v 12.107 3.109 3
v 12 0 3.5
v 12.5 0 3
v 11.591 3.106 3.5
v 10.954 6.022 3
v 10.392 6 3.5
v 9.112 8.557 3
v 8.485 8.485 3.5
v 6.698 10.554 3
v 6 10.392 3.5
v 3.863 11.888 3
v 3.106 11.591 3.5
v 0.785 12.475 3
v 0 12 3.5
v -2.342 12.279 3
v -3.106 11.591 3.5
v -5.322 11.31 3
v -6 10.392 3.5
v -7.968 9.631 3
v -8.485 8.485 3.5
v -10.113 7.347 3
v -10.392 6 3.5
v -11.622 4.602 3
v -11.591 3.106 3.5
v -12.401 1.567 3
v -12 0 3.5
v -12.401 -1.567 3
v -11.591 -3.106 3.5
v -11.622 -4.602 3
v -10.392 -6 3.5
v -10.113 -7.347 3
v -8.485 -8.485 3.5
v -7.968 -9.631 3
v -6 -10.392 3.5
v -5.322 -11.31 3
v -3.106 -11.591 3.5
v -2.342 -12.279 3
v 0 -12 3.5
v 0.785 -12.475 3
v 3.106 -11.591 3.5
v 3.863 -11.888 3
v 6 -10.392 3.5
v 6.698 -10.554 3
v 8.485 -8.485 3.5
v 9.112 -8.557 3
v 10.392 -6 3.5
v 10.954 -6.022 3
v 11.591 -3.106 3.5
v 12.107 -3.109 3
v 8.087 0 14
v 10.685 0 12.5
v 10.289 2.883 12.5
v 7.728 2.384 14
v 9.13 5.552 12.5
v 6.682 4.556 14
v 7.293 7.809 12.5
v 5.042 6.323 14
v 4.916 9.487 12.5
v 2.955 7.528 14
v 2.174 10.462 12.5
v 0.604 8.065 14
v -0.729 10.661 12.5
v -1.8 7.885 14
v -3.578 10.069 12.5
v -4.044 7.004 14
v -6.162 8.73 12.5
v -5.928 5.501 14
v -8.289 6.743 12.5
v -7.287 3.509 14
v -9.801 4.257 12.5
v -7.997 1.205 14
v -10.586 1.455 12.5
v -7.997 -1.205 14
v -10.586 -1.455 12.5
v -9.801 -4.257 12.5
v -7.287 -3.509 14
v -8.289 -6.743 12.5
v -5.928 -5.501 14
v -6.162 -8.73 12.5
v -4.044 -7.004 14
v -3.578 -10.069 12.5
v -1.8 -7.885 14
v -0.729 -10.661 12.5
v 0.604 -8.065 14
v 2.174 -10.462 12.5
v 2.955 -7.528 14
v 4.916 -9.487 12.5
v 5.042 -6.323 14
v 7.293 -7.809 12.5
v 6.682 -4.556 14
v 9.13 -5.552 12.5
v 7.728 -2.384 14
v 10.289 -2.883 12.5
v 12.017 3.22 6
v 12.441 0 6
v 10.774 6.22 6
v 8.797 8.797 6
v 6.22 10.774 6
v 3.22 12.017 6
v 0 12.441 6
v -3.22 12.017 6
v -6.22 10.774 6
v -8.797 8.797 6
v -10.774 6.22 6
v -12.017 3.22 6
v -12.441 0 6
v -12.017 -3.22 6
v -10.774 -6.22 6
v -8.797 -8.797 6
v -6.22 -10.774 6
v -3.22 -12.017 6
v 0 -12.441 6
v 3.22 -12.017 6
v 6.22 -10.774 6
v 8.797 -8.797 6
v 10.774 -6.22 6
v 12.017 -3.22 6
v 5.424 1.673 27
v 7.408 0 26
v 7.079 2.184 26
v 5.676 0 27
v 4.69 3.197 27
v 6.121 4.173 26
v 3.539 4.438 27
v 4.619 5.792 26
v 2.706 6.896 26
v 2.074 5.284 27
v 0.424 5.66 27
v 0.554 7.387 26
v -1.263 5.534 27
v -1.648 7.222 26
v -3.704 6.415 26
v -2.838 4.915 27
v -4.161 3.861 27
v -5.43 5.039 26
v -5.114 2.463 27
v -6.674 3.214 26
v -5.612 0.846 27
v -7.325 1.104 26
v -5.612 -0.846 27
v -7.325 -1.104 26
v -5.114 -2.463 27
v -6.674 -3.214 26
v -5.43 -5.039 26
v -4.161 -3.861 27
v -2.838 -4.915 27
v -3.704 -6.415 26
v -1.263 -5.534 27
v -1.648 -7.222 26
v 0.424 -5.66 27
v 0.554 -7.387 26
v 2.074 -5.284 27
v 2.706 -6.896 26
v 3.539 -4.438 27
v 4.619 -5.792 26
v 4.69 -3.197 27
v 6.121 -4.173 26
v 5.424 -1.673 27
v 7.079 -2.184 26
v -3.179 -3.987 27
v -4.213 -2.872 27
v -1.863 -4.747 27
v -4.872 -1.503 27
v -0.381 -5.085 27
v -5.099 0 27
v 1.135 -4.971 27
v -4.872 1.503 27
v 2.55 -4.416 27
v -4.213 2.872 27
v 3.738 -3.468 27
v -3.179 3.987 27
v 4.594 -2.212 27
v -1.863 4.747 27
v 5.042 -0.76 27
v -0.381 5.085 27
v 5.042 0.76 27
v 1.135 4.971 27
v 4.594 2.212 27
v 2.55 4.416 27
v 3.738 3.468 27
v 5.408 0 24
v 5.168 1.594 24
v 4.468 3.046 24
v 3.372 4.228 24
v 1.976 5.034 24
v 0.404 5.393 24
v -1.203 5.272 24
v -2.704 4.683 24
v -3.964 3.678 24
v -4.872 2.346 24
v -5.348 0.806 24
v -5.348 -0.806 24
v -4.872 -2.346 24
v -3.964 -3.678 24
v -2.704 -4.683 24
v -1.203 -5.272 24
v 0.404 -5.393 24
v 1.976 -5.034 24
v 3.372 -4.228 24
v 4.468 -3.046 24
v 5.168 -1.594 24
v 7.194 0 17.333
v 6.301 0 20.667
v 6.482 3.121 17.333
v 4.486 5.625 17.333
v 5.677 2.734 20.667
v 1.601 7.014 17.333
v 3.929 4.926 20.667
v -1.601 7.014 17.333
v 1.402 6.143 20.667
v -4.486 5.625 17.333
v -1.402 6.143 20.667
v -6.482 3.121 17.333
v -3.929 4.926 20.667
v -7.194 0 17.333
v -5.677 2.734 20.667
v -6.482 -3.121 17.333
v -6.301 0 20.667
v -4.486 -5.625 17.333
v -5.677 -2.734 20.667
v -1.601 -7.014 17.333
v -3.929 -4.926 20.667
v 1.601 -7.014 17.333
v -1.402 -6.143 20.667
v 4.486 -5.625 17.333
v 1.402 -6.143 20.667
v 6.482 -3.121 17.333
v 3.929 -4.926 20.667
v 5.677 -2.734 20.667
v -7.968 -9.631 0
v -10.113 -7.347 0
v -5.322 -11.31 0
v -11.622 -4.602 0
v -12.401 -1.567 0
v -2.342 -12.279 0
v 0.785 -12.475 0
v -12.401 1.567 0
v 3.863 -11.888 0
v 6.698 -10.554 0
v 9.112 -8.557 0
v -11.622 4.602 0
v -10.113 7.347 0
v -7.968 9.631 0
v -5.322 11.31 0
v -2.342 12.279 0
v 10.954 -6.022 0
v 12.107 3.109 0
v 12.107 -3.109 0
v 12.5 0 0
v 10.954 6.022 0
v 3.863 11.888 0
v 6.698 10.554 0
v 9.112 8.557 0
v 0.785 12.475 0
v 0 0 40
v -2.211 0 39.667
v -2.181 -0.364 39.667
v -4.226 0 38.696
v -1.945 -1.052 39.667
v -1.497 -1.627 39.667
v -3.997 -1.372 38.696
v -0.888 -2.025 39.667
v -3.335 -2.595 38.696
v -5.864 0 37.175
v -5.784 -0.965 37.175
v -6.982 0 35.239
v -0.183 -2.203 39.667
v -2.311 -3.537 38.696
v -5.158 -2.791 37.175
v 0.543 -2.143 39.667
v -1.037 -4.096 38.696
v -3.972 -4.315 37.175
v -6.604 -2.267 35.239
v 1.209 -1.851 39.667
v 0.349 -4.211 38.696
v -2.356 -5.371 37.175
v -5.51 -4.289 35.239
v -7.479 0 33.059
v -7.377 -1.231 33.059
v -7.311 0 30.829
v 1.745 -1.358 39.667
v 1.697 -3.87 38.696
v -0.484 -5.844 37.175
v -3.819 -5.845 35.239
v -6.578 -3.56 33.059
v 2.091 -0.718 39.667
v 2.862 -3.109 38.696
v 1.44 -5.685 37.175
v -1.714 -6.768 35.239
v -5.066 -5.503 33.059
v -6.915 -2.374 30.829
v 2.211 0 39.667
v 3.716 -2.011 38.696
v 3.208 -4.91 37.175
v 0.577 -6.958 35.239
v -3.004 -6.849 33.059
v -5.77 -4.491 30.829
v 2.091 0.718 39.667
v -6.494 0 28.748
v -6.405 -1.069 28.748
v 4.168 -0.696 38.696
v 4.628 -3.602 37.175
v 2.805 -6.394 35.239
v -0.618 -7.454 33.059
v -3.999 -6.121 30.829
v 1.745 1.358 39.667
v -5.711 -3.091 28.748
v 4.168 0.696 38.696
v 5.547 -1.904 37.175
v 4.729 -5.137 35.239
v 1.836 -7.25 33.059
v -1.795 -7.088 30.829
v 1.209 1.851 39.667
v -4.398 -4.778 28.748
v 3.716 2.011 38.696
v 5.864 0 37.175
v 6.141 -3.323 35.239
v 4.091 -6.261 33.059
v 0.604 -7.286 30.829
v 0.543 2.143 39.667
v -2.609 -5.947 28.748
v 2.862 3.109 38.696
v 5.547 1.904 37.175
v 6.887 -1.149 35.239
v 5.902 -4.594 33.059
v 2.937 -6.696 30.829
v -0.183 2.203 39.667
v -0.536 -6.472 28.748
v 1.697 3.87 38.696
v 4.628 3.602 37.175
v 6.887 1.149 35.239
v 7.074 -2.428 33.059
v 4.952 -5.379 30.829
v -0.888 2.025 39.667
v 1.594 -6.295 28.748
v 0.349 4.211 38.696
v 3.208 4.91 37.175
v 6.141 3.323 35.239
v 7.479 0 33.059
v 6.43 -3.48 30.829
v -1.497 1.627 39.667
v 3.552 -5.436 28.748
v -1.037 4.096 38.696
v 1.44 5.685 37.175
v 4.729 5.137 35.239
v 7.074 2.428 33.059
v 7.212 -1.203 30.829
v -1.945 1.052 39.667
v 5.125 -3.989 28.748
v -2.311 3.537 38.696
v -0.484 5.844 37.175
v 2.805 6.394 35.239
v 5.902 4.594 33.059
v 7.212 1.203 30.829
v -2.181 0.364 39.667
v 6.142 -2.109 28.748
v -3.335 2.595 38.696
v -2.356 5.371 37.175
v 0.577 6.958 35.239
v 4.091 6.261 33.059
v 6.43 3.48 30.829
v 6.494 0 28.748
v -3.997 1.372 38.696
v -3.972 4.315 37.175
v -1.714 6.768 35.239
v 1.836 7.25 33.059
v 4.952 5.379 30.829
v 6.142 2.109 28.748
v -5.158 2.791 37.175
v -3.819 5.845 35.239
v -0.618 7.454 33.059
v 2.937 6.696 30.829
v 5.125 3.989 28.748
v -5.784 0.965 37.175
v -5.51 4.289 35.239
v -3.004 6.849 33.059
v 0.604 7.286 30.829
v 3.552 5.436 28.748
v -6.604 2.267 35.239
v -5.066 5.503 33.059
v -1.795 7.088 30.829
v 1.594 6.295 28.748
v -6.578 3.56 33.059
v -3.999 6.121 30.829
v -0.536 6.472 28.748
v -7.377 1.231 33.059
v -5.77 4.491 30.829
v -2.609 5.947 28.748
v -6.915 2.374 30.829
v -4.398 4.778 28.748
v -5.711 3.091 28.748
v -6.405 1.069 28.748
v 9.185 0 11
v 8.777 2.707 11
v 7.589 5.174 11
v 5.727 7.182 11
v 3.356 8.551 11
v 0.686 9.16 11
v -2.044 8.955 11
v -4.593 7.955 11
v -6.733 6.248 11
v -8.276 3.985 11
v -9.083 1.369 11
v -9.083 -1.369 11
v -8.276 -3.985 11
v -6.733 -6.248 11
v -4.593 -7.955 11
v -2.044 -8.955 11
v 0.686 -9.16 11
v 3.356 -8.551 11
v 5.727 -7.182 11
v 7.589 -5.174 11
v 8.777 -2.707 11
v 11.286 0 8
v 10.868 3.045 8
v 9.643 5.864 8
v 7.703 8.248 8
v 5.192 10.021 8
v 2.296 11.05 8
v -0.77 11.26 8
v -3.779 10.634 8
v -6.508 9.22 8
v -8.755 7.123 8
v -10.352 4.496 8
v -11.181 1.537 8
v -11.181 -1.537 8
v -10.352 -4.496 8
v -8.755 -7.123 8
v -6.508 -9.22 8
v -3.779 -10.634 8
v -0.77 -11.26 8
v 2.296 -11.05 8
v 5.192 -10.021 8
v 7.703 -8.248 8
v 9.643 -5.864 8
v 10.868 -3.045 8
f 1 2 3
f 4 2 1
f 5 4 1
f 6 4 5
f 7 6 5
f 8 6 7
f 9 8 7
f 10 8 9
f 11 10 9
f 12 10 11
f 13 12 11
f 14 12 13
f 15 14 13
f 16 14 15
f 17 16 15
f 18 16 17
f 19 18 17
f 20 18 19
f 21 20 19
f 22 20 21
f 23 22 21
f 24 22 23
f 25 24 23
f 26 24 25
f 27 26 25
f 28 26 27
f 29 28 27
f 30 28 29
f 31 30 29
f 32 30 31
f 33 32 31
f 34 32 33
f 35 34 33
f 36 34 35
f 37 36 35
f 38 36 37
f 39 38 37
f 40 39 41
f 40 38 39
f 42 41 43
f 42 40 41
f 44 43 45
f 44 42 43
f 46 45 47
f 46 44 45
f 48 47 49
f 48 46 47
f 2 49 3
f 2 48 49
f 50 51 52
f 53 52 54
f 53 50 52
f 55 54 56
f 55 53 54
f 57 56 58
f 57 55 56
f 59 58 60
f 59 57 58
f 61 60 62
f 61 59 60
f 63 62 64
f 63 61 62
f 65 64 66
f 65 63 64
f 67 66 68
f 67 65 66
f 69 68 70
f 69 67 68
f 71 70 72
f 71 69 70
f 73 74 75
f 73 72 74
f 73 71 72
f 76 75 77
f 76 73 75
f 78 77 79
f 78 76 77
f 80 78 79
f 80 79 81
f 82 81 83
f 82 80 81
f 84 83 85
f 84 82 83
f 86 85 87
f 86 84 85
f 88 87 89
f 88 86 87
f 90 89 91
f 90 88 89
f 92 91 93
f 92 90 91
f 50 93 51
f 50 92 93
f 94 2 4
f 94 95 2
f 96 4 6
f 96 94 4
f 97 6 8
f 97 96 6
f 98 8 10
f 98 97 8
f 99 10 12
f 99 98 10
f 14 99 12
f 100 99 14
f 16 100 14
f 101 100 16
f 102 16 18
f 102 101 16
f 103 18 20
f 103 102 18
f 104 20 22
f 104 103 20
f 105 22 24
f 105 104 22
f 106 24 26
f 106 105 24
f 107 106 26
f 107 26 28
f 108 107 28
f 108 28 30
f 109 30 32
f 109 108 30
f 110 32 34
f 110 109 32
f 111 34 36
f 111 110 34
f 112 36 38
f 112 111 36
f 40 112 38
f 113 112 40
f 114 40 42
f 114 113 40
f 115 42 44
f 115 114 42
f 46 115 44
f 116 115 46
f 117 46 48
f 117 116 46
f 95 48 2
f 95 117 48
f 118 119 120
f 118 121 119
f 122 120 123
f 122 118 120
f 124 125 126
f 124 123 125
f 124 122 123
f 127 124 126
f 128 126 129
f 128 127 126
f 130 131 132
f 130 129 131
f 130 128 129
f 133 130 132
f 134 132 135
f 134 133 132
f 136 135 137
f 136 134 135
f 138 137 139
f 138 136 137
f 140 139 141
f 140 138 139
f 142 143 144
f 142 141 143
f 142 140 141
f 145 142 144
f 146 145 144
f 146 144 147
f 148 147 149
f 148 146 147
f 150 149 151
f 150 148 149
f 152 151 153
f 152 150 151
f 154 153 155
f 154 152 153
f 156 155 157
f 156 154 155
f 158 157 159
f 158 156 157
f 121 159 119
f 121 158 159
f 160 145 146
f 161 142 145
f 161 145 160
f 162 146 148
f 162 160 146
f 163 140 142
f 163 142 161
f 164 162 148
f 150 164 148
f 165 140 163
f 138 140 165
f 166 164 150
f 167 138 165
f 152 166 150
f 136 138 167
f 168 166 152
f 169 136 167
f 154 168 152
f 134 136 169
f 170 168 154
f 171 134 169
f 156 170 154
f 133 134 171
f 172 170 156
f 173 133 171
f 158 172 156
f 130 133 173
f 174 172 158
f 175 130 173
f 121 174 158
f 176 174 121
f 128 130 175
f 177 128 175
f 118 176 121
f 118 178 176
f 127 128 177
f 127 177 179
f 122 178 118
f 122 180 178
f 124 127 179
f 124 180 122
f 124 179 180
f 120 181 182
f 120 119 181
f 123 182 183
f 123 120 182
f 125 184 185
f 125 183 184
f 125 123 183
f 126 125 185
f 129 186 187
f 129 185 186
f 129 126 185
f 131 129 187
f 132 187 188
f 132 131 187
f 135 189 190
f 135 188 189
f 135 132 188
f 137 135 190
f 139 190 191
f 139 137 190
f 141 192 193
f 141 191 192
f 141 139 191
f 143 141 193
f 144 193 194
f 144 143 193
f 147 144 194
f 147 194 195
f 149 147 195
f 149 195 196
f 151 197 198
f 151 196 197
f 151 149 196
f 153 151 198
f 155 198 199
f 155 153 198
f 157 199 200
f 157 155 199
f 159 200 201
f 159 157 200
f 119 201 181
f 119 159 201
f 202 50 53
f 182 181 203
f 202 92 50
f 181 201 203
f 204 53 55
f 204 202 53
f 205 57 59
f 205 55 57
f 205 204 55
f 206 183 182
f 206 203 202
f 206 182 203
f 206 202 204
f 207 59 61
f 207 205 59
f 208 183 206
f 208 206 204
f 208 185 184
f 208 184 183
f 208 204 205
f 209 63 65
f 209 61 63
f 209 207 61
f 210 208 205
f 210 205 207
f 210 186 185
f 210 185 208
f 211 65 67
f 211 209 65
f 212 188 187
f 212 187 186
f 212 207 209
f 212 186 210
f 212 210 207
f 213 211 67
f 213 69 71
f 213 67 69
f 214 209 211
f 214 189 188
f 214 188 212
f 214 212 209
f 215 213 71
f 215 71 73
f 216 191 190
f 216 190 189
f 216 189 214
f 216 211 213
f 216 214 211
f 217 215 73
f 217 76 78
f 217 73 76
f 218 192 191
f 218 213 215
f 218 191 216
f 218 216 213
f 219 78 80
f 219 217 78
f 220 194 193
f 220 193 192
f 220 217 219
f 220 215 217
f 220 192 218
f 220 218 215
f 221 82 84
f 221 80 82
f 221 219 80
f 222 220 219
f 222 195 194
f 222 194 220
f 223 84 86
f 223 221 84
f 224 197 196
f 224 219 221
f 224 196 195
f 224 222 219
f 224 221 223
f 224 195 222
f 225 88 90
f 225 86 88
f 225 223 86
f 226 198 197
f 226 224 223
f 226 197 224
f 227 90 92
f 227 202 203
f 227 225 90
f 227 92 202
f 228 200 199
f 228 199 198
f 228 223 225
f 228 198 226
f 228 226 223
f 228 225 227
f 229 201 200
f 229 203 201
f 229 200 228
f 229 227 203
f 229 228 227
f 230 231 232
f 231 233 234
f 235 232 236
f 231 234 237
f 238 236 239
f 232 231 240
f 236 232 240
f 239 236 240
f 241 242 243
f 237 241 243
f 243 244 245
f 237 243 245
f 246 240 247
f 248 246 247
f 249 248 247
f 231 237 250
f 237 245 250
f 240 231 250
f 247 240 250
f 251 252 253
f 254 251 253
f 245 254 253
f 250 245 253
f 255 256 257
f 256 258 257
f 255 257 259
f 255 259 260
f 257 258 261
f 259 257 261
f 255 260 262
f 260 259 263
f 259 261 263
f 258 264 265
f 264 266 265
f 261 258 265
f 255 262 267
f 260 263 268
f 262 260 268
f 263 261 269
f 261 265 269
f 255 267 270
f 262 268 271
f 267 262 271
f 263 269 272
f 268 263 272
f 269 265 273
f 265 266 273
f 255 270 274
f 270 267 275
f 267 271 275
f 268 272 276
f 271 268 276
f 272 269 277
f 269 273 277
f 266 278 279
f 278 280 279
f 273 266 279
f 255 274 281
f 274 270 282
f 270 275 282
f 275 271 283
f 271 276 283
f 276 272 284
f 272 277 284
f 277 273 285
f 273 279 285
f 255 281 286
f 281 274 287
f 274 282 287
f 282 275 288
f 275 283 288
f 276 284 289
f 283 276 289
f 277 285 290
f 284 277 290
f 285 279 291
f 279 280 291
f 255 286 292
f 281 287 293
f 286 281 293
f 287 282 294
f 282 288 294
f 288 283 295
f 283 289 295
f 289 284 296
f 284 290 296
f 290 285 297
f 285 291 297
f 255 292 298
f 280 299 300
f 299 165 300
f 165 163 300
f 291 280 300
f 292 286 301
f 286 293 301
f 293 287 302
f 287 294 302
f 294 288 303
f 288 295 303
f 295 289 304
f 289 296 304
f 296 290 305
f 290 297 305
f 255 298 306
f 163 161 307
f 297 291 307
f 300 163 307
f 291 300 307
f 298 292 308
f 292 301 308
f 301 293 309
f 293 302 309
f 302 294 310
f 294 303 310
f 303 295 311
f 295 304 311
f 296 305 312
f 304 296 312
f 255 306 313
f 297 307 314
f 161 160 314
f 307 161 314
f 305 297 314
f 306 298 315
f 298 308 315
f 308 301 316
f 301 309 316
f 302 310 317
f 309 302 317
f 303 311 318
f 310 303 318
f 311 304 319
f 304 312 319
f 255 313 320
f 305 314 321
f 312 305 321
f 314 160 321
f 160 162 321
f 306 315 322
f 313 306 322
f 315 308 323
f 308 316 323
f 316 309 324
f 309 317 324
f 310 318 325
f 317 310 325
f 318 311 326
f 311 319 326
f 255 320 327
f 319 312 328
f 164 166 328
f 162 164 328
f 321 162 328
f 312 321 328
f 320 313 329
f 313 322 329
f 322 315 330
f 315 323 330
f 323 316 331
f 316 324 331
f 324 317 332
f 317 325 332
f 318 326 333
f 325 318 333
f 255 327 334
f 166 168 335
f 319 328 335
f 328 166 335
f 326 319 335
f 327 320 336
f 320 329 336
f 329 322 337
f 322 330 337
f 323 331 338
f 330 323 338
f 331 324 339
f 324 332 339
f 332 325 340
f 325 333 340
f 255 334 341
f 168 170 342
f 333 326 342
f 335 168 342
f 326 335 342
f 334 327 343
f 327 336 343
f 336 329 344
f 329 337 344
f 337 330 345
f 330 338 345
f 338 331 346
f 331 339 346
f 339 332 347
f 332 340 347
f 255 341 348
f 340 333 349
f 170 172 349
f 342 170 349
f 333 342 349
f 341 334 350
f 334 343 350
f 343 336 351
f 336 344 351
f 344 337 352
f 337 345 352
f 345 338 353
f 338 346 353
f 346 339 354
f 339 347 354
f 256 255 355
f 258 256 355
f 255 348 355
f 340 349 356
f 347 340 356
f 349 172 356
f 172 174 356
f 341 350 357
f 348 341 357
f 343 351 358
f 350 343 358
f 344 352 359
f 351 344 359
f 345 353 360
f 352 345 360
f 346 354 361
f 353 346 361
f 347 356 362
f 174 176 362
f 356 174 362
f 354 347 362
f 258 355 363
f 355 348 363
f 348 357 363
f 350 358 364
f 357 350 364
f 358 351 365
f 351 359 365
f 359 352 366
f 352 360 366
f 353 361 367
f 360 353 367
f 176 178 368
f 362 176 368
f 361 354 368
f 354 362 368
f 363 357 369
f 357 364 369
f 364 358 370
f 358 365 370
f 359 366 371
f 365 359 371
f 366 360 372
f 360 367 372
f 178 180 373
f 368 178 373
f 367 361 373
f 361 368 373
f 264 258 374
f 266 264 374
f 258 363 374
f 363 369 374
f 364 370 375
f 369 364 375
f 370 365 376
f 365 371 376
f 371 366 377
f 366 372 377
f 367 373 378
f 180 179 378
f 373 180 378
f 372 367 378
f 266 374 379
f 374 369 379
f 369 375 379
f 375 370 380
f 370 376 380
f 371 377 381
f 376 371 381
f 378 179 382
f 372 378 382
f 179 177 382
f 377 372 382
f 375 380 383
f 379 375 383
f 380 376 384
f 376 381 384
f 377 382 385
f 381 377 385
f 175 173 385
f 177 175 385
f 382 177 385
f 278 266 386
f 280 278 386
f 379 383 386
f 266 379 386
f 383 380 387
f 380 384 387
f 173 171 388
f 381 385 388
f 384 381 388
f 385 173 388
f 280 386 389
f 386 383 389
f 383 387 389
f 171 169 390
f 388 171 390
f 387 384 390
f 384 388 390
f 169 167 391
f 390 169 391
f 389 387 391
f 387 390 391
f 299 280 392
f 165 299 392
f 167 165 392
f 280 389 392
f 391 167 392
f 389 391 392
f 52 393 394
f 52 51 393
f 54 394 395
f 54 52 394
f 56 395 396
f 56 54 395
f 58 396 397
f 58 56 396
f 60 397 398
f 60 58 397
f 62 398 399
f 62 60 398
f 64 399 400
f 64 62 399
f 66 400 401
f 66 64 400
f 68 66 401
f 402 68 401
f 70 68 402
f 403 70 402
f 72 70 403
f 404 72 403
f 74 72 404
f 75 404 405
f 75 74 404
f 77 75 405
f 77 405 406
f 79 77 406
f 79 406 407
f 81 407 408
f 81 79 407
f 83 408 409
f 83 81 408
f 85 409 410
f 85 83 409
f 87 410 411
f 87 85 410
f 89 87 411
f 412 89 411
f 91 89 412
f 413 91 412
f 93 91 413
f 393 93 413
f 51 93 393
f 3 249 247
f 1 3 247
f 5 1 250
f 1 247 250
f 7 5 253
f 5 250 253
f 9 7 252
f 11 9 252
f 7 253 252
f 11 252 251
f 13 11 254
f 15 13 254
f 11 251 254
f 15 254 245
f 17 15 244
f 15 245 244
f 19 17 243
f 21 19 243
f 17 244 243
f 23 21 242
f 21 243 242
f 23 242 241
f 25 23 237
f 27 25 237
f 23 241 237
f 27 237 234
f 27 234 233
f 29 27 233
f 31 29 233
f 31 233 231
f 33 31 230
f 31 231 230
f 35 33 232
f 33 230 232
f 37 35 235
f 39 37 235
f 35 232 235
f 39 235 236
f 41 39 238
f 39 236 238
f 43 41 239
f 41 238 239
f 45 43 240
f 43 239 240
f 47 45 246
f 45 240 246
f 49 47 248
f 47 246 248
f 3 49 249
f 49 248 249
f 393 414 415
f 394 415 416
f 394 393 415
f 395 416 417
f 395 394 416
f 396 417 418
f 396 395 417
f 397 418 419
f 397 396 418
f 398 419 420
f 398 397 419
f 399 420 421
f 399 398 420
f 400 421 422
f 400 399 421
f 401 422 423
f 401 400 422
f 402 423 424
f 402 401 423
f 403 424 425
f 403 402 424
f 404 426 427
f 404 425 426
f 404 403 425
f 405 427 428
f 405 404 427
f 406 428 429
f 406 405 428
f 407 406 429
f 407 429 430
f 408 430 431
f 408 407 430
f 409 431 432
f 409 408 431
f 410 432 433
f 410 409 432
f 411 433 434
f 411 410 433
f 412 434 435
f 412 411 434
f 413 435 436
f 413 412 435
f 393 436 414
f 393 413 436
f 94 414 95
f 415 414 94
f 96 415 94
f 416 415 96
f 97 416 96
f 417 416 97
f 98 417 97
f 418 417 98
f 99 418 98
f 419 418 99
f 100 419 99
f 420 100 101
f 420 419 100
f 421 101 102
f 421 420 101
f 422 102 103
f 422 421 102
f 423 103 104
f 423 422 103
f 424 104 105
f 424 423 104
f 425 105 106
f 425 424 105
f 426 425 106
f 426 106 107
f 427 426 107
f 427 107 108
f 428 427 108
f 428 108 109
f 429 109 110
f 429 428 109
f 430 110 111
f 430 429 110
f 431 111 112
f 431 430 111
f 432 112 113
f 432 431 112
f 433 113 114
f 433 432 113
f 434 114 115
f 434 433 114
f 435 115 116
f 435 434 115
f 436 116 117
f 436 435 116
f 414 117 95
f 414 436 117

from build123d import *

# Parameters (mm, degrees)
F0_R      = 12.5
F1_DEPTH  = 3
F1_FACE_R = 12.5
F2_DEPTH  = 0.5
F2_TAPER  = 45
F2_FACE_R = 12
F3_DEPTH  = 2.5
F3_TAPER  = -10
F3_FACE_R = 12.4408174518
F4_DEPTH  = 2
F4_TAPER  = 30
F4_FACE_R = 11.2861169134
F5_DEPTH  = 3
F5_TAPER  = 35
F5_FACE_R = 9.1854942988
F6_DEPTH  = 1.5
F6_TAPER  = -45
F6_FACE_R = 10.6854942988
F7_DEPTH  = 1.5
F7_TAPER  = 60
F7_FACE_R = 8.0874180874
F8_DEPTH  = 10
F8_TAPER  = 15
F8_FACE_R = 5.4079261631
F9_DEPTH  = 2
F9_TAPER  = -45
F9_FACE_R = 7.4079261631
F10_DEPTH = 1
F10_TAPER = 60


with BuildPart() as f1:
    # F0 (on Top) → F1 (new body)
    with BuildSketch(Plane.XY):
        Circle(F0_R)
    extrude(amount=F1_DEPTH)

    # F1_face (on face) → F2 (join)
    with BuildSketch(Plane.XY.offset(3)):
        Circle(F1_FACE_R)
    extrude(amount=F2_DEPTH, taper=F2_TAPER)

    # F2_face (on face) → F3 (join)
    with BuildSketch(Plane.XY.offset(3.5)):
        Circle(F2_FACE_R)
    extrude(amount=F3_DEPTH, taper=F3_TAPER)

    # F3_face (on face) → F4 (join)
    with BuildSketch(Plane.XY.offset(6)):
        Circle(F3_FACE_R)
    extrude(amount=F4_DEPTH, taper=F4_TAPER)

    # F4_face (on face) → F5 (join)
    with BuildSketch(Plane.XY.offset(8)):
        Circle(F4_FACE_R)
    extrude(amount=F5_DEPTH, taper=F5_TAPER)

    # F5_face (on face) → F6 (join)
    with BuildSketch(Plane.XY.offset(11)):
        Circle(F5_FACE_R)
    extrude(amount=F6_DEPTH, taper=F6_TAPER)

    # F6_face (on face) → F7 (join)
    with BuildSketch(Plane.XY.offset(12.5)):
        Circle(F6_FACE_R)
    extrude(amount=F7_DEPTH, taper=F7_TAPER)

    # F7_face (on face) → F8 (join)
    with BuildSketch(Plane.XY.offset(14)):
        Circle(F7_FACE_R)
    extrude(amount=F8_DEPTH, taper=F8_TAPER)

    # F8_face (on face) → F9 (join)
    with BuildSketch(Plane.XY.offset(24)):
        Circle(F8_FACE_R)
    extrude(amount=F9_DEPTH, taper=F9_TAPER)

    # F9_face (on face) → F10 (join)
    with BuildSketch(Plane.XY.offset(26)):
        Circle(F9_FACE_R)
    extrude(amount=F10_DEPTH, taper=F10_TAPER)

    # F11 (on Front) → F12 (revolve)
    with BuildSketch(Plane.XZ):
        with BuildLine():
            ThreePointArc((0, 40), (-7.5, 32.5), (0, 25))
            Line((0, 25), (0, 40))
        make_face()
    revolve(axis=Axis((0, 0, 21.0038799897), (0, 0, 1)))


solid = f1.part
